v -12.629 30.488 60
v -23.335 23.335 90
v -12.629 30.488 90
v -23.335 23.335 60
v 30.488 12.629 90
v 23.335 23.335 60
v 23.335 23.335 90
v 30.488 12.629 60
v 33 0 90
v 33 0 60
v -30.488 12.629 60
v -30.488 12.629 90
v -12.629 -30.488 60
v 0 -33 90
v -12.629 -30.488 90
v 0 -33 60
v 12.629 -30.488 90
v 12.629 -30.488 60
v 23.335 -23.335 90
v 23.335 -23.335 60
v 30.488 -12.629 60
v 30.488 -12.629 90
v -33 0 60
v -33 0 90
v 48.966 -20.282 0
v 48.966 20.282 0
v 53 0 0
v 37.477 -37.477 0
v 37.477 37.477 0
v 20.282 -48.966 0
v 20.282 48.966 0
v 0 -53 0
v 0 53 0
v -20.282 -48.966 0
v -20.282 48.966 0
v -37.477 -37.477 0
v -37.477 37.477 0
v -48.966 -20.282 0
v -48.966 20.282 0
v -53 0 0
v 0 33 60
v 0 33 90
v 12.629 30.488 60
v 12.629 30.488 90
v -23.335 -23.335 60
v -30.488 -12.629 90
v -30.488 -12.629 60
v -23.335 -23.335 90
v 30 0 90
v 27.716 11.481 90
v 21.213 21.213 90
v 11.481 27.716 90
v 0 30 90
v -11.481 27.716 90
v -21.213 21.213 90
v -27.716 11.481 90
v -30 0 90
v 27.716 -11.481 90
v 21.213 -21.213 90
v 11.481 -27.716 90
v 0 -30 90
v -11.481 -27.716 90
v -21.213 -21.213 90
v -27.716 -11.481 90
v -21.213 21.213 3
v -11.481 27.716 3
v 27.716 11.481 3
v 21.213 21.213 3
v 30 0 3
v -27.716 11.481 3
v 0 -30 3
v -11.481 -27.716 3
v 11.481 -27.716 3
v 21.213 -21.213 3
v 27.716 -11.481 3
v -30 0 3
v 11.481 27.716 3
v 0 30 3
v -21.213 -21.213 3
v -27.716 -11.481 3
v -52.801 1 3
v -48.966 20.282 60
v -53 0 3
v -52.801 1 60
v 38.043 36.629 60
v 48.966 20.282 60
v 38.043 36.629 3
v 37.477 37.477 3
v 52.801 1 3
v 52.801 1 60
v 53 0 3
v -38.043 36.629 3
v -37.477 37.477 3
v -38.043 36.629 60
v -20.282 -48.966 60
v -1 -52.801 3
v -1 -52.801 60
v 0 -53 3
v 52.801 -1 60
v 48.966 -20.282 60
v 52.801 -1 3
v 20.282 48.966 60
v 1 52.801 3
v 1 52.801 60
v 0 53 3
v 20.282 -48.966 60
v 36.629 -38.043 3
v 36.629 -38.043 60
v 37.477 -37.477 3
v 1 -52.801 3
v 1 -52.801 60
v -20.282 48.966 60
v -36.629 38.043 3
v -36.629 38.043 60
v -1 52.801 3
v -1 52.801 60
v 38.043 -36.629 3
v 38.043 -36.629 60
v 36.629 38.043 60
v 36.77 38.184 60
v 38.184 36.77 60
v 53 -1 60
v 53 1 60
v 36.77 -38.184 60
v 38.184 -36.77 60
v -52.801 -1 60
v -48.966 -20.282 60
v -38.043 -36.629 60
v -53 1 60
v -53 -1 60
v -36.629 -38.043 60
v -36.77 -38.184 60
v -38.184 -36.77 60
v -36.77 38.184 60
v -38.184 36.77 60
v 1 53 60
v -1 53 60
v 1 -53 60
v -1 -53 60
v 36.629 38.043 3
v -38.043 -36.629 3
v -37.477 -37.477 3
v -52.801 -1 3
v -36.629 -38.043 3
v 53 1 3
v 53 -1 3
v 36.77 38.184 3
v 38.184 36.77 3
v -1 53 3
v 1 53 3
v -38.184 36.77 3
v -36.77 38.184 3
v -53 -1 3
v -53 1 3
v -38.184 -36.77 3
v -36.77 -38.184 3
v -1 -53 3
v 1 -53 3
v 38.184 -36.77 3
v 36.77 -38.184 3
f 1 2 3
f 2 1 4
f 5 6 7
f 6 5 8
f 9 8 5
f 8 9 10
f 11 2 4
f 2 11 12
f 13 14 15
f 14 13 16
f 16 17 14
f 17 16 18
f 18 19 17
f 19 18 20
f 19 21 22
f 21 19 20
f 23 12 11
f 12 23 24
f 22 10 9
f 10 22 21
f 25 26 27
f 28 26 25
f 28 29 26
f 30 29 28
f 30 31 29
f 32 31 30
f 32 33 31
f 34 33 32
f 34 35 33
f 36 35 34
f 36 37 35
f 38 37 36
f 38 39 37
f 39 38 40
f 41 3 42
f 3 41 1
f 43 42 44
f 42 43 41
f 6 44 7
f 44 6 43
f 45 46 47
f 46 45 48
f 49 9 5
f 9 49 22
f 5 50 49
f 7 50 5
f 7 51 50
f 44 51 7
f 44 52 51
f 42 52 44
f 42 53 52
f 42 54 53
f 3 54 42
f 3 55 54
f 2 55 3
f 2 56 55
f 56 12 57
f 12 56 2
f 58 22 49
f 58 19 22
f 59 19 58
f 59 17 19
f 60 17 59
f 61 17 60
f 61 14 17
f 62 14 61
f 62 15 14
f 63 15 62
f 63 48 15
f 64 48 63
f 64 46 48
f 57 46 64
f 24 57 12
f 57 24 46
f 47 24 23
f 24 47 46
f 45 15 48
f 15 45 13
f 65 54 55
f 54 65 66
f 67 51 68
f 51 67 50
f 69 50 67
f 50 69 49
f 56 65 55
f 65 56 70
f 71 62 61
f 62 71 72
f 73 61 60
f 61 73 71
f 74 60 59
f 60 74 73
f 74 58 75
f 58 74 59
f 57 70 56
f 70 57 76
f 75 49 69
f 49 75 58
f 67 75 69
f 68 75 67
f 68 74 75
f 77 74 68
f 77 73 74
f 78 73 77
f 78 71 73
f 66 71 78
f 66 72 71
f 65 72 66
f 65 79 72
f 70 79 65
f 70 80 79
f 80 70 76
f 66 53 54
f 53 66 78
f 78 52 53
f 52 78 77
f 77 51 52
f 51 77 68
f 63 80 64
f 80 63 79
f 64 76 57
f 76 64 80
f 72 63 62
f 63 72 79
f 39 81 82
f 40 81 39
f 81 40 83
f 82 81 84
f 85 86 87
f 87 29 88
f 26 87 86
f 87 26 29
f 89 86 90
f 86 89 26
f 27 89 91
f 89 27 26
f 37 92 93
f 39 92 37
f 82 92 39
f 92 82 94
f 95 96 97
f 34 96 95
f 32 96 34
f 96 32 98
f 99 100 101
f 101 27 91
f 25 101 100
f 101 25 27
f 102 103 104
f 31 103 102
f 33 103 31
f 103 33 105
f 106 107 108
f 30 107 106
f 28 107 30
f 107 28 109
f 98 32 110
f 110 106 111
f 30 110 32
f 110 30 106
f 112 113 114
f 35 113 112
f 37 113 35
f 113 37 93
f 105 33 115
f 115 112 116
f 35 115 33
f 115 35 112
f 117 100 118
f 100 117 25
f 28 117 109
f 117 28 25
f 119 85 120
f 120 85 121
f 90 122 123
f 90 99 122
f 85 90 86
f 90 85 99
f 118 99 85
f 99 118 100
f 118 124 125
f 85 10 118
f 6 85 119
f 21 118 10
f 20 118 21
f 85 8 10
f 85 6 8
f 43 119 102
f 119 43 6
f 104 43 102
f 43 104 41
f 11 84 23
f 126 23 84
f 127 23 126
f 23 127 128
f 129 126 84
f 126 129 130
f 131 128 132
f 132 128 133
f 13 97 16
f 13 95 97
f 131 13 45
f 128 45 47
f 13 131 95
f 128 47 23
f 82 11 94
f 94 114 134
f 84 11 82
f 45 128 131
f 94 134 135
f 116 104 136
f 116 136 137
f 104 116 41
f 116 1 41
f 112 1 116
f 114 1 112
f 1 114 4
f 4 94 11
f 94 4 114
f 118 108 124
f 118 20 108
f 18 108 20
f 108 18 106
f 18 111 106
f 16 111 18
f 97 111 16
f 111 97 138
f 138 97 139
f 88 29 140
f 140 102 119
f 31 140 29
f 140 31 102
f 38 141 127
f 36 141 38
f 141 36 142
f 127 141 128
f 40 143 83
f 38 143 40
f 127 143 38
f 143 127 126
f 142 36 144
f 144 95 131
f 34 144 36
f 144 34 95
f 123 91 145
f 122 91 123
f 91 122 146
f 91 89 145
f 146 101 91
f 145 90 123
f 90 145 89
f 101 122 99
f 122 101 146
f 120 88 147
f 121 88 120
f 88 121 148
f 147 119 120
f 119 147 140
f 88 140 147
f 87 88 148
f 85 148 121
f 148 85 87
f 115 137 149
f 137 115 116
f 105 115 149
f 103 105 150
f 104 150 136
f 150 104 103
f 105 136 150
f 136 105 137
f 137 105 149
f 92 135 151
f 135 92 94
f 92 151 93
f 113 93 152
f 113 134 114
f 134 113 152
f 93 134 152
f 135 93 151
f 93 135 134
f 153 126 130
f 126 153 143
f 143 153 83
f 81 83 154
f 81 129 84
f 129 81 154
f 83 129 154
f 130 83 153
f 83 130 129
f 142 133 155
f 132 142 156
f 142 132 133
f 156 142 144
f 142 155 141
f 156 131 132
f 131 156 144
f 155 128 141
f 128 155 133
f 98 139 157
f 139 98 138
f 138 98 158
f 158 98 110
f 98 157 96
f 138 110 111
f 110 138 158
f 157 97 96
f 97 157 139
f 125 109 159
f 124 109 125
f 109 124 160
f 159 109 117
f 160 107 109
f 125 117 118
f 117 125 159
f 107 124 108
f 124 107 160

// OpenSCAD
// Stiftköcher mit radialem Außenring
// Version 2.0

// --- Parameter ---
inner_diameter   = 60;   // Durchmesser des inneren Hauptfachs (mm)
inner_height     = 90;   // Höhe des inneren Fachs (mm)

outer_ring_width = 20;   // Breite des äußeren Ringes (mm)
outer_height     = 60;   // Höhe des äußeren Ringes (mm)

wall_thickness   = 3;    // Wandstärke außen (mm)
bottom_thickness = 3;    // Bodenstärke (mm)

outer_compartments   = 8;   // Anzahl schmaler Außenfächer
outer_wall_thickness = 2;   // Dicke der Trennwände außen (mm)

$fn = 16 ; // Rundungen fein

// --- Hauptmodul ---
module pen_holder() {
    // Innenzylinder
    difference() {
        cylinder(h = inner_height, r = (inner_diameter/2) + wall_thickness);
        translate([0,0,bottom_thickness])
            cylinder(h = inner_height - bottom_thickness, r = inner_diameter/2);
    }

    // Außenring mit Fächern
    outer_ring();
}

// --- Außenring mit radialen Fächern ---
module outer_ring() {
    outer_radius = (inner_diameter/2) + outer_ring_width + wall_thickness;
    inner_radius = (inner_diameter/2) + wall_thickness;

    // Außenringkörper
    difference() {
        cylinder(h = outer_height, r = outer_radius);
        translate([0,0,bottom_thickness])
            cylinder(h = outer_height - bottom_thickness, r = inner_radius);
    }

    // Radiale Trennwände
    for (i = [0:outer_compartments-1]) {
        angle = 360/outer_compartments * i;
        rotate([0,0,angle])
            translate([inner_radius, -outer_wall_thickness/2, bottom_thickness])
                cube([outer_ring_width, outer_wall_thickness, outer_height - bottom_thickness]);
    }
}

// --- Aufruf ---
pen_holder();
